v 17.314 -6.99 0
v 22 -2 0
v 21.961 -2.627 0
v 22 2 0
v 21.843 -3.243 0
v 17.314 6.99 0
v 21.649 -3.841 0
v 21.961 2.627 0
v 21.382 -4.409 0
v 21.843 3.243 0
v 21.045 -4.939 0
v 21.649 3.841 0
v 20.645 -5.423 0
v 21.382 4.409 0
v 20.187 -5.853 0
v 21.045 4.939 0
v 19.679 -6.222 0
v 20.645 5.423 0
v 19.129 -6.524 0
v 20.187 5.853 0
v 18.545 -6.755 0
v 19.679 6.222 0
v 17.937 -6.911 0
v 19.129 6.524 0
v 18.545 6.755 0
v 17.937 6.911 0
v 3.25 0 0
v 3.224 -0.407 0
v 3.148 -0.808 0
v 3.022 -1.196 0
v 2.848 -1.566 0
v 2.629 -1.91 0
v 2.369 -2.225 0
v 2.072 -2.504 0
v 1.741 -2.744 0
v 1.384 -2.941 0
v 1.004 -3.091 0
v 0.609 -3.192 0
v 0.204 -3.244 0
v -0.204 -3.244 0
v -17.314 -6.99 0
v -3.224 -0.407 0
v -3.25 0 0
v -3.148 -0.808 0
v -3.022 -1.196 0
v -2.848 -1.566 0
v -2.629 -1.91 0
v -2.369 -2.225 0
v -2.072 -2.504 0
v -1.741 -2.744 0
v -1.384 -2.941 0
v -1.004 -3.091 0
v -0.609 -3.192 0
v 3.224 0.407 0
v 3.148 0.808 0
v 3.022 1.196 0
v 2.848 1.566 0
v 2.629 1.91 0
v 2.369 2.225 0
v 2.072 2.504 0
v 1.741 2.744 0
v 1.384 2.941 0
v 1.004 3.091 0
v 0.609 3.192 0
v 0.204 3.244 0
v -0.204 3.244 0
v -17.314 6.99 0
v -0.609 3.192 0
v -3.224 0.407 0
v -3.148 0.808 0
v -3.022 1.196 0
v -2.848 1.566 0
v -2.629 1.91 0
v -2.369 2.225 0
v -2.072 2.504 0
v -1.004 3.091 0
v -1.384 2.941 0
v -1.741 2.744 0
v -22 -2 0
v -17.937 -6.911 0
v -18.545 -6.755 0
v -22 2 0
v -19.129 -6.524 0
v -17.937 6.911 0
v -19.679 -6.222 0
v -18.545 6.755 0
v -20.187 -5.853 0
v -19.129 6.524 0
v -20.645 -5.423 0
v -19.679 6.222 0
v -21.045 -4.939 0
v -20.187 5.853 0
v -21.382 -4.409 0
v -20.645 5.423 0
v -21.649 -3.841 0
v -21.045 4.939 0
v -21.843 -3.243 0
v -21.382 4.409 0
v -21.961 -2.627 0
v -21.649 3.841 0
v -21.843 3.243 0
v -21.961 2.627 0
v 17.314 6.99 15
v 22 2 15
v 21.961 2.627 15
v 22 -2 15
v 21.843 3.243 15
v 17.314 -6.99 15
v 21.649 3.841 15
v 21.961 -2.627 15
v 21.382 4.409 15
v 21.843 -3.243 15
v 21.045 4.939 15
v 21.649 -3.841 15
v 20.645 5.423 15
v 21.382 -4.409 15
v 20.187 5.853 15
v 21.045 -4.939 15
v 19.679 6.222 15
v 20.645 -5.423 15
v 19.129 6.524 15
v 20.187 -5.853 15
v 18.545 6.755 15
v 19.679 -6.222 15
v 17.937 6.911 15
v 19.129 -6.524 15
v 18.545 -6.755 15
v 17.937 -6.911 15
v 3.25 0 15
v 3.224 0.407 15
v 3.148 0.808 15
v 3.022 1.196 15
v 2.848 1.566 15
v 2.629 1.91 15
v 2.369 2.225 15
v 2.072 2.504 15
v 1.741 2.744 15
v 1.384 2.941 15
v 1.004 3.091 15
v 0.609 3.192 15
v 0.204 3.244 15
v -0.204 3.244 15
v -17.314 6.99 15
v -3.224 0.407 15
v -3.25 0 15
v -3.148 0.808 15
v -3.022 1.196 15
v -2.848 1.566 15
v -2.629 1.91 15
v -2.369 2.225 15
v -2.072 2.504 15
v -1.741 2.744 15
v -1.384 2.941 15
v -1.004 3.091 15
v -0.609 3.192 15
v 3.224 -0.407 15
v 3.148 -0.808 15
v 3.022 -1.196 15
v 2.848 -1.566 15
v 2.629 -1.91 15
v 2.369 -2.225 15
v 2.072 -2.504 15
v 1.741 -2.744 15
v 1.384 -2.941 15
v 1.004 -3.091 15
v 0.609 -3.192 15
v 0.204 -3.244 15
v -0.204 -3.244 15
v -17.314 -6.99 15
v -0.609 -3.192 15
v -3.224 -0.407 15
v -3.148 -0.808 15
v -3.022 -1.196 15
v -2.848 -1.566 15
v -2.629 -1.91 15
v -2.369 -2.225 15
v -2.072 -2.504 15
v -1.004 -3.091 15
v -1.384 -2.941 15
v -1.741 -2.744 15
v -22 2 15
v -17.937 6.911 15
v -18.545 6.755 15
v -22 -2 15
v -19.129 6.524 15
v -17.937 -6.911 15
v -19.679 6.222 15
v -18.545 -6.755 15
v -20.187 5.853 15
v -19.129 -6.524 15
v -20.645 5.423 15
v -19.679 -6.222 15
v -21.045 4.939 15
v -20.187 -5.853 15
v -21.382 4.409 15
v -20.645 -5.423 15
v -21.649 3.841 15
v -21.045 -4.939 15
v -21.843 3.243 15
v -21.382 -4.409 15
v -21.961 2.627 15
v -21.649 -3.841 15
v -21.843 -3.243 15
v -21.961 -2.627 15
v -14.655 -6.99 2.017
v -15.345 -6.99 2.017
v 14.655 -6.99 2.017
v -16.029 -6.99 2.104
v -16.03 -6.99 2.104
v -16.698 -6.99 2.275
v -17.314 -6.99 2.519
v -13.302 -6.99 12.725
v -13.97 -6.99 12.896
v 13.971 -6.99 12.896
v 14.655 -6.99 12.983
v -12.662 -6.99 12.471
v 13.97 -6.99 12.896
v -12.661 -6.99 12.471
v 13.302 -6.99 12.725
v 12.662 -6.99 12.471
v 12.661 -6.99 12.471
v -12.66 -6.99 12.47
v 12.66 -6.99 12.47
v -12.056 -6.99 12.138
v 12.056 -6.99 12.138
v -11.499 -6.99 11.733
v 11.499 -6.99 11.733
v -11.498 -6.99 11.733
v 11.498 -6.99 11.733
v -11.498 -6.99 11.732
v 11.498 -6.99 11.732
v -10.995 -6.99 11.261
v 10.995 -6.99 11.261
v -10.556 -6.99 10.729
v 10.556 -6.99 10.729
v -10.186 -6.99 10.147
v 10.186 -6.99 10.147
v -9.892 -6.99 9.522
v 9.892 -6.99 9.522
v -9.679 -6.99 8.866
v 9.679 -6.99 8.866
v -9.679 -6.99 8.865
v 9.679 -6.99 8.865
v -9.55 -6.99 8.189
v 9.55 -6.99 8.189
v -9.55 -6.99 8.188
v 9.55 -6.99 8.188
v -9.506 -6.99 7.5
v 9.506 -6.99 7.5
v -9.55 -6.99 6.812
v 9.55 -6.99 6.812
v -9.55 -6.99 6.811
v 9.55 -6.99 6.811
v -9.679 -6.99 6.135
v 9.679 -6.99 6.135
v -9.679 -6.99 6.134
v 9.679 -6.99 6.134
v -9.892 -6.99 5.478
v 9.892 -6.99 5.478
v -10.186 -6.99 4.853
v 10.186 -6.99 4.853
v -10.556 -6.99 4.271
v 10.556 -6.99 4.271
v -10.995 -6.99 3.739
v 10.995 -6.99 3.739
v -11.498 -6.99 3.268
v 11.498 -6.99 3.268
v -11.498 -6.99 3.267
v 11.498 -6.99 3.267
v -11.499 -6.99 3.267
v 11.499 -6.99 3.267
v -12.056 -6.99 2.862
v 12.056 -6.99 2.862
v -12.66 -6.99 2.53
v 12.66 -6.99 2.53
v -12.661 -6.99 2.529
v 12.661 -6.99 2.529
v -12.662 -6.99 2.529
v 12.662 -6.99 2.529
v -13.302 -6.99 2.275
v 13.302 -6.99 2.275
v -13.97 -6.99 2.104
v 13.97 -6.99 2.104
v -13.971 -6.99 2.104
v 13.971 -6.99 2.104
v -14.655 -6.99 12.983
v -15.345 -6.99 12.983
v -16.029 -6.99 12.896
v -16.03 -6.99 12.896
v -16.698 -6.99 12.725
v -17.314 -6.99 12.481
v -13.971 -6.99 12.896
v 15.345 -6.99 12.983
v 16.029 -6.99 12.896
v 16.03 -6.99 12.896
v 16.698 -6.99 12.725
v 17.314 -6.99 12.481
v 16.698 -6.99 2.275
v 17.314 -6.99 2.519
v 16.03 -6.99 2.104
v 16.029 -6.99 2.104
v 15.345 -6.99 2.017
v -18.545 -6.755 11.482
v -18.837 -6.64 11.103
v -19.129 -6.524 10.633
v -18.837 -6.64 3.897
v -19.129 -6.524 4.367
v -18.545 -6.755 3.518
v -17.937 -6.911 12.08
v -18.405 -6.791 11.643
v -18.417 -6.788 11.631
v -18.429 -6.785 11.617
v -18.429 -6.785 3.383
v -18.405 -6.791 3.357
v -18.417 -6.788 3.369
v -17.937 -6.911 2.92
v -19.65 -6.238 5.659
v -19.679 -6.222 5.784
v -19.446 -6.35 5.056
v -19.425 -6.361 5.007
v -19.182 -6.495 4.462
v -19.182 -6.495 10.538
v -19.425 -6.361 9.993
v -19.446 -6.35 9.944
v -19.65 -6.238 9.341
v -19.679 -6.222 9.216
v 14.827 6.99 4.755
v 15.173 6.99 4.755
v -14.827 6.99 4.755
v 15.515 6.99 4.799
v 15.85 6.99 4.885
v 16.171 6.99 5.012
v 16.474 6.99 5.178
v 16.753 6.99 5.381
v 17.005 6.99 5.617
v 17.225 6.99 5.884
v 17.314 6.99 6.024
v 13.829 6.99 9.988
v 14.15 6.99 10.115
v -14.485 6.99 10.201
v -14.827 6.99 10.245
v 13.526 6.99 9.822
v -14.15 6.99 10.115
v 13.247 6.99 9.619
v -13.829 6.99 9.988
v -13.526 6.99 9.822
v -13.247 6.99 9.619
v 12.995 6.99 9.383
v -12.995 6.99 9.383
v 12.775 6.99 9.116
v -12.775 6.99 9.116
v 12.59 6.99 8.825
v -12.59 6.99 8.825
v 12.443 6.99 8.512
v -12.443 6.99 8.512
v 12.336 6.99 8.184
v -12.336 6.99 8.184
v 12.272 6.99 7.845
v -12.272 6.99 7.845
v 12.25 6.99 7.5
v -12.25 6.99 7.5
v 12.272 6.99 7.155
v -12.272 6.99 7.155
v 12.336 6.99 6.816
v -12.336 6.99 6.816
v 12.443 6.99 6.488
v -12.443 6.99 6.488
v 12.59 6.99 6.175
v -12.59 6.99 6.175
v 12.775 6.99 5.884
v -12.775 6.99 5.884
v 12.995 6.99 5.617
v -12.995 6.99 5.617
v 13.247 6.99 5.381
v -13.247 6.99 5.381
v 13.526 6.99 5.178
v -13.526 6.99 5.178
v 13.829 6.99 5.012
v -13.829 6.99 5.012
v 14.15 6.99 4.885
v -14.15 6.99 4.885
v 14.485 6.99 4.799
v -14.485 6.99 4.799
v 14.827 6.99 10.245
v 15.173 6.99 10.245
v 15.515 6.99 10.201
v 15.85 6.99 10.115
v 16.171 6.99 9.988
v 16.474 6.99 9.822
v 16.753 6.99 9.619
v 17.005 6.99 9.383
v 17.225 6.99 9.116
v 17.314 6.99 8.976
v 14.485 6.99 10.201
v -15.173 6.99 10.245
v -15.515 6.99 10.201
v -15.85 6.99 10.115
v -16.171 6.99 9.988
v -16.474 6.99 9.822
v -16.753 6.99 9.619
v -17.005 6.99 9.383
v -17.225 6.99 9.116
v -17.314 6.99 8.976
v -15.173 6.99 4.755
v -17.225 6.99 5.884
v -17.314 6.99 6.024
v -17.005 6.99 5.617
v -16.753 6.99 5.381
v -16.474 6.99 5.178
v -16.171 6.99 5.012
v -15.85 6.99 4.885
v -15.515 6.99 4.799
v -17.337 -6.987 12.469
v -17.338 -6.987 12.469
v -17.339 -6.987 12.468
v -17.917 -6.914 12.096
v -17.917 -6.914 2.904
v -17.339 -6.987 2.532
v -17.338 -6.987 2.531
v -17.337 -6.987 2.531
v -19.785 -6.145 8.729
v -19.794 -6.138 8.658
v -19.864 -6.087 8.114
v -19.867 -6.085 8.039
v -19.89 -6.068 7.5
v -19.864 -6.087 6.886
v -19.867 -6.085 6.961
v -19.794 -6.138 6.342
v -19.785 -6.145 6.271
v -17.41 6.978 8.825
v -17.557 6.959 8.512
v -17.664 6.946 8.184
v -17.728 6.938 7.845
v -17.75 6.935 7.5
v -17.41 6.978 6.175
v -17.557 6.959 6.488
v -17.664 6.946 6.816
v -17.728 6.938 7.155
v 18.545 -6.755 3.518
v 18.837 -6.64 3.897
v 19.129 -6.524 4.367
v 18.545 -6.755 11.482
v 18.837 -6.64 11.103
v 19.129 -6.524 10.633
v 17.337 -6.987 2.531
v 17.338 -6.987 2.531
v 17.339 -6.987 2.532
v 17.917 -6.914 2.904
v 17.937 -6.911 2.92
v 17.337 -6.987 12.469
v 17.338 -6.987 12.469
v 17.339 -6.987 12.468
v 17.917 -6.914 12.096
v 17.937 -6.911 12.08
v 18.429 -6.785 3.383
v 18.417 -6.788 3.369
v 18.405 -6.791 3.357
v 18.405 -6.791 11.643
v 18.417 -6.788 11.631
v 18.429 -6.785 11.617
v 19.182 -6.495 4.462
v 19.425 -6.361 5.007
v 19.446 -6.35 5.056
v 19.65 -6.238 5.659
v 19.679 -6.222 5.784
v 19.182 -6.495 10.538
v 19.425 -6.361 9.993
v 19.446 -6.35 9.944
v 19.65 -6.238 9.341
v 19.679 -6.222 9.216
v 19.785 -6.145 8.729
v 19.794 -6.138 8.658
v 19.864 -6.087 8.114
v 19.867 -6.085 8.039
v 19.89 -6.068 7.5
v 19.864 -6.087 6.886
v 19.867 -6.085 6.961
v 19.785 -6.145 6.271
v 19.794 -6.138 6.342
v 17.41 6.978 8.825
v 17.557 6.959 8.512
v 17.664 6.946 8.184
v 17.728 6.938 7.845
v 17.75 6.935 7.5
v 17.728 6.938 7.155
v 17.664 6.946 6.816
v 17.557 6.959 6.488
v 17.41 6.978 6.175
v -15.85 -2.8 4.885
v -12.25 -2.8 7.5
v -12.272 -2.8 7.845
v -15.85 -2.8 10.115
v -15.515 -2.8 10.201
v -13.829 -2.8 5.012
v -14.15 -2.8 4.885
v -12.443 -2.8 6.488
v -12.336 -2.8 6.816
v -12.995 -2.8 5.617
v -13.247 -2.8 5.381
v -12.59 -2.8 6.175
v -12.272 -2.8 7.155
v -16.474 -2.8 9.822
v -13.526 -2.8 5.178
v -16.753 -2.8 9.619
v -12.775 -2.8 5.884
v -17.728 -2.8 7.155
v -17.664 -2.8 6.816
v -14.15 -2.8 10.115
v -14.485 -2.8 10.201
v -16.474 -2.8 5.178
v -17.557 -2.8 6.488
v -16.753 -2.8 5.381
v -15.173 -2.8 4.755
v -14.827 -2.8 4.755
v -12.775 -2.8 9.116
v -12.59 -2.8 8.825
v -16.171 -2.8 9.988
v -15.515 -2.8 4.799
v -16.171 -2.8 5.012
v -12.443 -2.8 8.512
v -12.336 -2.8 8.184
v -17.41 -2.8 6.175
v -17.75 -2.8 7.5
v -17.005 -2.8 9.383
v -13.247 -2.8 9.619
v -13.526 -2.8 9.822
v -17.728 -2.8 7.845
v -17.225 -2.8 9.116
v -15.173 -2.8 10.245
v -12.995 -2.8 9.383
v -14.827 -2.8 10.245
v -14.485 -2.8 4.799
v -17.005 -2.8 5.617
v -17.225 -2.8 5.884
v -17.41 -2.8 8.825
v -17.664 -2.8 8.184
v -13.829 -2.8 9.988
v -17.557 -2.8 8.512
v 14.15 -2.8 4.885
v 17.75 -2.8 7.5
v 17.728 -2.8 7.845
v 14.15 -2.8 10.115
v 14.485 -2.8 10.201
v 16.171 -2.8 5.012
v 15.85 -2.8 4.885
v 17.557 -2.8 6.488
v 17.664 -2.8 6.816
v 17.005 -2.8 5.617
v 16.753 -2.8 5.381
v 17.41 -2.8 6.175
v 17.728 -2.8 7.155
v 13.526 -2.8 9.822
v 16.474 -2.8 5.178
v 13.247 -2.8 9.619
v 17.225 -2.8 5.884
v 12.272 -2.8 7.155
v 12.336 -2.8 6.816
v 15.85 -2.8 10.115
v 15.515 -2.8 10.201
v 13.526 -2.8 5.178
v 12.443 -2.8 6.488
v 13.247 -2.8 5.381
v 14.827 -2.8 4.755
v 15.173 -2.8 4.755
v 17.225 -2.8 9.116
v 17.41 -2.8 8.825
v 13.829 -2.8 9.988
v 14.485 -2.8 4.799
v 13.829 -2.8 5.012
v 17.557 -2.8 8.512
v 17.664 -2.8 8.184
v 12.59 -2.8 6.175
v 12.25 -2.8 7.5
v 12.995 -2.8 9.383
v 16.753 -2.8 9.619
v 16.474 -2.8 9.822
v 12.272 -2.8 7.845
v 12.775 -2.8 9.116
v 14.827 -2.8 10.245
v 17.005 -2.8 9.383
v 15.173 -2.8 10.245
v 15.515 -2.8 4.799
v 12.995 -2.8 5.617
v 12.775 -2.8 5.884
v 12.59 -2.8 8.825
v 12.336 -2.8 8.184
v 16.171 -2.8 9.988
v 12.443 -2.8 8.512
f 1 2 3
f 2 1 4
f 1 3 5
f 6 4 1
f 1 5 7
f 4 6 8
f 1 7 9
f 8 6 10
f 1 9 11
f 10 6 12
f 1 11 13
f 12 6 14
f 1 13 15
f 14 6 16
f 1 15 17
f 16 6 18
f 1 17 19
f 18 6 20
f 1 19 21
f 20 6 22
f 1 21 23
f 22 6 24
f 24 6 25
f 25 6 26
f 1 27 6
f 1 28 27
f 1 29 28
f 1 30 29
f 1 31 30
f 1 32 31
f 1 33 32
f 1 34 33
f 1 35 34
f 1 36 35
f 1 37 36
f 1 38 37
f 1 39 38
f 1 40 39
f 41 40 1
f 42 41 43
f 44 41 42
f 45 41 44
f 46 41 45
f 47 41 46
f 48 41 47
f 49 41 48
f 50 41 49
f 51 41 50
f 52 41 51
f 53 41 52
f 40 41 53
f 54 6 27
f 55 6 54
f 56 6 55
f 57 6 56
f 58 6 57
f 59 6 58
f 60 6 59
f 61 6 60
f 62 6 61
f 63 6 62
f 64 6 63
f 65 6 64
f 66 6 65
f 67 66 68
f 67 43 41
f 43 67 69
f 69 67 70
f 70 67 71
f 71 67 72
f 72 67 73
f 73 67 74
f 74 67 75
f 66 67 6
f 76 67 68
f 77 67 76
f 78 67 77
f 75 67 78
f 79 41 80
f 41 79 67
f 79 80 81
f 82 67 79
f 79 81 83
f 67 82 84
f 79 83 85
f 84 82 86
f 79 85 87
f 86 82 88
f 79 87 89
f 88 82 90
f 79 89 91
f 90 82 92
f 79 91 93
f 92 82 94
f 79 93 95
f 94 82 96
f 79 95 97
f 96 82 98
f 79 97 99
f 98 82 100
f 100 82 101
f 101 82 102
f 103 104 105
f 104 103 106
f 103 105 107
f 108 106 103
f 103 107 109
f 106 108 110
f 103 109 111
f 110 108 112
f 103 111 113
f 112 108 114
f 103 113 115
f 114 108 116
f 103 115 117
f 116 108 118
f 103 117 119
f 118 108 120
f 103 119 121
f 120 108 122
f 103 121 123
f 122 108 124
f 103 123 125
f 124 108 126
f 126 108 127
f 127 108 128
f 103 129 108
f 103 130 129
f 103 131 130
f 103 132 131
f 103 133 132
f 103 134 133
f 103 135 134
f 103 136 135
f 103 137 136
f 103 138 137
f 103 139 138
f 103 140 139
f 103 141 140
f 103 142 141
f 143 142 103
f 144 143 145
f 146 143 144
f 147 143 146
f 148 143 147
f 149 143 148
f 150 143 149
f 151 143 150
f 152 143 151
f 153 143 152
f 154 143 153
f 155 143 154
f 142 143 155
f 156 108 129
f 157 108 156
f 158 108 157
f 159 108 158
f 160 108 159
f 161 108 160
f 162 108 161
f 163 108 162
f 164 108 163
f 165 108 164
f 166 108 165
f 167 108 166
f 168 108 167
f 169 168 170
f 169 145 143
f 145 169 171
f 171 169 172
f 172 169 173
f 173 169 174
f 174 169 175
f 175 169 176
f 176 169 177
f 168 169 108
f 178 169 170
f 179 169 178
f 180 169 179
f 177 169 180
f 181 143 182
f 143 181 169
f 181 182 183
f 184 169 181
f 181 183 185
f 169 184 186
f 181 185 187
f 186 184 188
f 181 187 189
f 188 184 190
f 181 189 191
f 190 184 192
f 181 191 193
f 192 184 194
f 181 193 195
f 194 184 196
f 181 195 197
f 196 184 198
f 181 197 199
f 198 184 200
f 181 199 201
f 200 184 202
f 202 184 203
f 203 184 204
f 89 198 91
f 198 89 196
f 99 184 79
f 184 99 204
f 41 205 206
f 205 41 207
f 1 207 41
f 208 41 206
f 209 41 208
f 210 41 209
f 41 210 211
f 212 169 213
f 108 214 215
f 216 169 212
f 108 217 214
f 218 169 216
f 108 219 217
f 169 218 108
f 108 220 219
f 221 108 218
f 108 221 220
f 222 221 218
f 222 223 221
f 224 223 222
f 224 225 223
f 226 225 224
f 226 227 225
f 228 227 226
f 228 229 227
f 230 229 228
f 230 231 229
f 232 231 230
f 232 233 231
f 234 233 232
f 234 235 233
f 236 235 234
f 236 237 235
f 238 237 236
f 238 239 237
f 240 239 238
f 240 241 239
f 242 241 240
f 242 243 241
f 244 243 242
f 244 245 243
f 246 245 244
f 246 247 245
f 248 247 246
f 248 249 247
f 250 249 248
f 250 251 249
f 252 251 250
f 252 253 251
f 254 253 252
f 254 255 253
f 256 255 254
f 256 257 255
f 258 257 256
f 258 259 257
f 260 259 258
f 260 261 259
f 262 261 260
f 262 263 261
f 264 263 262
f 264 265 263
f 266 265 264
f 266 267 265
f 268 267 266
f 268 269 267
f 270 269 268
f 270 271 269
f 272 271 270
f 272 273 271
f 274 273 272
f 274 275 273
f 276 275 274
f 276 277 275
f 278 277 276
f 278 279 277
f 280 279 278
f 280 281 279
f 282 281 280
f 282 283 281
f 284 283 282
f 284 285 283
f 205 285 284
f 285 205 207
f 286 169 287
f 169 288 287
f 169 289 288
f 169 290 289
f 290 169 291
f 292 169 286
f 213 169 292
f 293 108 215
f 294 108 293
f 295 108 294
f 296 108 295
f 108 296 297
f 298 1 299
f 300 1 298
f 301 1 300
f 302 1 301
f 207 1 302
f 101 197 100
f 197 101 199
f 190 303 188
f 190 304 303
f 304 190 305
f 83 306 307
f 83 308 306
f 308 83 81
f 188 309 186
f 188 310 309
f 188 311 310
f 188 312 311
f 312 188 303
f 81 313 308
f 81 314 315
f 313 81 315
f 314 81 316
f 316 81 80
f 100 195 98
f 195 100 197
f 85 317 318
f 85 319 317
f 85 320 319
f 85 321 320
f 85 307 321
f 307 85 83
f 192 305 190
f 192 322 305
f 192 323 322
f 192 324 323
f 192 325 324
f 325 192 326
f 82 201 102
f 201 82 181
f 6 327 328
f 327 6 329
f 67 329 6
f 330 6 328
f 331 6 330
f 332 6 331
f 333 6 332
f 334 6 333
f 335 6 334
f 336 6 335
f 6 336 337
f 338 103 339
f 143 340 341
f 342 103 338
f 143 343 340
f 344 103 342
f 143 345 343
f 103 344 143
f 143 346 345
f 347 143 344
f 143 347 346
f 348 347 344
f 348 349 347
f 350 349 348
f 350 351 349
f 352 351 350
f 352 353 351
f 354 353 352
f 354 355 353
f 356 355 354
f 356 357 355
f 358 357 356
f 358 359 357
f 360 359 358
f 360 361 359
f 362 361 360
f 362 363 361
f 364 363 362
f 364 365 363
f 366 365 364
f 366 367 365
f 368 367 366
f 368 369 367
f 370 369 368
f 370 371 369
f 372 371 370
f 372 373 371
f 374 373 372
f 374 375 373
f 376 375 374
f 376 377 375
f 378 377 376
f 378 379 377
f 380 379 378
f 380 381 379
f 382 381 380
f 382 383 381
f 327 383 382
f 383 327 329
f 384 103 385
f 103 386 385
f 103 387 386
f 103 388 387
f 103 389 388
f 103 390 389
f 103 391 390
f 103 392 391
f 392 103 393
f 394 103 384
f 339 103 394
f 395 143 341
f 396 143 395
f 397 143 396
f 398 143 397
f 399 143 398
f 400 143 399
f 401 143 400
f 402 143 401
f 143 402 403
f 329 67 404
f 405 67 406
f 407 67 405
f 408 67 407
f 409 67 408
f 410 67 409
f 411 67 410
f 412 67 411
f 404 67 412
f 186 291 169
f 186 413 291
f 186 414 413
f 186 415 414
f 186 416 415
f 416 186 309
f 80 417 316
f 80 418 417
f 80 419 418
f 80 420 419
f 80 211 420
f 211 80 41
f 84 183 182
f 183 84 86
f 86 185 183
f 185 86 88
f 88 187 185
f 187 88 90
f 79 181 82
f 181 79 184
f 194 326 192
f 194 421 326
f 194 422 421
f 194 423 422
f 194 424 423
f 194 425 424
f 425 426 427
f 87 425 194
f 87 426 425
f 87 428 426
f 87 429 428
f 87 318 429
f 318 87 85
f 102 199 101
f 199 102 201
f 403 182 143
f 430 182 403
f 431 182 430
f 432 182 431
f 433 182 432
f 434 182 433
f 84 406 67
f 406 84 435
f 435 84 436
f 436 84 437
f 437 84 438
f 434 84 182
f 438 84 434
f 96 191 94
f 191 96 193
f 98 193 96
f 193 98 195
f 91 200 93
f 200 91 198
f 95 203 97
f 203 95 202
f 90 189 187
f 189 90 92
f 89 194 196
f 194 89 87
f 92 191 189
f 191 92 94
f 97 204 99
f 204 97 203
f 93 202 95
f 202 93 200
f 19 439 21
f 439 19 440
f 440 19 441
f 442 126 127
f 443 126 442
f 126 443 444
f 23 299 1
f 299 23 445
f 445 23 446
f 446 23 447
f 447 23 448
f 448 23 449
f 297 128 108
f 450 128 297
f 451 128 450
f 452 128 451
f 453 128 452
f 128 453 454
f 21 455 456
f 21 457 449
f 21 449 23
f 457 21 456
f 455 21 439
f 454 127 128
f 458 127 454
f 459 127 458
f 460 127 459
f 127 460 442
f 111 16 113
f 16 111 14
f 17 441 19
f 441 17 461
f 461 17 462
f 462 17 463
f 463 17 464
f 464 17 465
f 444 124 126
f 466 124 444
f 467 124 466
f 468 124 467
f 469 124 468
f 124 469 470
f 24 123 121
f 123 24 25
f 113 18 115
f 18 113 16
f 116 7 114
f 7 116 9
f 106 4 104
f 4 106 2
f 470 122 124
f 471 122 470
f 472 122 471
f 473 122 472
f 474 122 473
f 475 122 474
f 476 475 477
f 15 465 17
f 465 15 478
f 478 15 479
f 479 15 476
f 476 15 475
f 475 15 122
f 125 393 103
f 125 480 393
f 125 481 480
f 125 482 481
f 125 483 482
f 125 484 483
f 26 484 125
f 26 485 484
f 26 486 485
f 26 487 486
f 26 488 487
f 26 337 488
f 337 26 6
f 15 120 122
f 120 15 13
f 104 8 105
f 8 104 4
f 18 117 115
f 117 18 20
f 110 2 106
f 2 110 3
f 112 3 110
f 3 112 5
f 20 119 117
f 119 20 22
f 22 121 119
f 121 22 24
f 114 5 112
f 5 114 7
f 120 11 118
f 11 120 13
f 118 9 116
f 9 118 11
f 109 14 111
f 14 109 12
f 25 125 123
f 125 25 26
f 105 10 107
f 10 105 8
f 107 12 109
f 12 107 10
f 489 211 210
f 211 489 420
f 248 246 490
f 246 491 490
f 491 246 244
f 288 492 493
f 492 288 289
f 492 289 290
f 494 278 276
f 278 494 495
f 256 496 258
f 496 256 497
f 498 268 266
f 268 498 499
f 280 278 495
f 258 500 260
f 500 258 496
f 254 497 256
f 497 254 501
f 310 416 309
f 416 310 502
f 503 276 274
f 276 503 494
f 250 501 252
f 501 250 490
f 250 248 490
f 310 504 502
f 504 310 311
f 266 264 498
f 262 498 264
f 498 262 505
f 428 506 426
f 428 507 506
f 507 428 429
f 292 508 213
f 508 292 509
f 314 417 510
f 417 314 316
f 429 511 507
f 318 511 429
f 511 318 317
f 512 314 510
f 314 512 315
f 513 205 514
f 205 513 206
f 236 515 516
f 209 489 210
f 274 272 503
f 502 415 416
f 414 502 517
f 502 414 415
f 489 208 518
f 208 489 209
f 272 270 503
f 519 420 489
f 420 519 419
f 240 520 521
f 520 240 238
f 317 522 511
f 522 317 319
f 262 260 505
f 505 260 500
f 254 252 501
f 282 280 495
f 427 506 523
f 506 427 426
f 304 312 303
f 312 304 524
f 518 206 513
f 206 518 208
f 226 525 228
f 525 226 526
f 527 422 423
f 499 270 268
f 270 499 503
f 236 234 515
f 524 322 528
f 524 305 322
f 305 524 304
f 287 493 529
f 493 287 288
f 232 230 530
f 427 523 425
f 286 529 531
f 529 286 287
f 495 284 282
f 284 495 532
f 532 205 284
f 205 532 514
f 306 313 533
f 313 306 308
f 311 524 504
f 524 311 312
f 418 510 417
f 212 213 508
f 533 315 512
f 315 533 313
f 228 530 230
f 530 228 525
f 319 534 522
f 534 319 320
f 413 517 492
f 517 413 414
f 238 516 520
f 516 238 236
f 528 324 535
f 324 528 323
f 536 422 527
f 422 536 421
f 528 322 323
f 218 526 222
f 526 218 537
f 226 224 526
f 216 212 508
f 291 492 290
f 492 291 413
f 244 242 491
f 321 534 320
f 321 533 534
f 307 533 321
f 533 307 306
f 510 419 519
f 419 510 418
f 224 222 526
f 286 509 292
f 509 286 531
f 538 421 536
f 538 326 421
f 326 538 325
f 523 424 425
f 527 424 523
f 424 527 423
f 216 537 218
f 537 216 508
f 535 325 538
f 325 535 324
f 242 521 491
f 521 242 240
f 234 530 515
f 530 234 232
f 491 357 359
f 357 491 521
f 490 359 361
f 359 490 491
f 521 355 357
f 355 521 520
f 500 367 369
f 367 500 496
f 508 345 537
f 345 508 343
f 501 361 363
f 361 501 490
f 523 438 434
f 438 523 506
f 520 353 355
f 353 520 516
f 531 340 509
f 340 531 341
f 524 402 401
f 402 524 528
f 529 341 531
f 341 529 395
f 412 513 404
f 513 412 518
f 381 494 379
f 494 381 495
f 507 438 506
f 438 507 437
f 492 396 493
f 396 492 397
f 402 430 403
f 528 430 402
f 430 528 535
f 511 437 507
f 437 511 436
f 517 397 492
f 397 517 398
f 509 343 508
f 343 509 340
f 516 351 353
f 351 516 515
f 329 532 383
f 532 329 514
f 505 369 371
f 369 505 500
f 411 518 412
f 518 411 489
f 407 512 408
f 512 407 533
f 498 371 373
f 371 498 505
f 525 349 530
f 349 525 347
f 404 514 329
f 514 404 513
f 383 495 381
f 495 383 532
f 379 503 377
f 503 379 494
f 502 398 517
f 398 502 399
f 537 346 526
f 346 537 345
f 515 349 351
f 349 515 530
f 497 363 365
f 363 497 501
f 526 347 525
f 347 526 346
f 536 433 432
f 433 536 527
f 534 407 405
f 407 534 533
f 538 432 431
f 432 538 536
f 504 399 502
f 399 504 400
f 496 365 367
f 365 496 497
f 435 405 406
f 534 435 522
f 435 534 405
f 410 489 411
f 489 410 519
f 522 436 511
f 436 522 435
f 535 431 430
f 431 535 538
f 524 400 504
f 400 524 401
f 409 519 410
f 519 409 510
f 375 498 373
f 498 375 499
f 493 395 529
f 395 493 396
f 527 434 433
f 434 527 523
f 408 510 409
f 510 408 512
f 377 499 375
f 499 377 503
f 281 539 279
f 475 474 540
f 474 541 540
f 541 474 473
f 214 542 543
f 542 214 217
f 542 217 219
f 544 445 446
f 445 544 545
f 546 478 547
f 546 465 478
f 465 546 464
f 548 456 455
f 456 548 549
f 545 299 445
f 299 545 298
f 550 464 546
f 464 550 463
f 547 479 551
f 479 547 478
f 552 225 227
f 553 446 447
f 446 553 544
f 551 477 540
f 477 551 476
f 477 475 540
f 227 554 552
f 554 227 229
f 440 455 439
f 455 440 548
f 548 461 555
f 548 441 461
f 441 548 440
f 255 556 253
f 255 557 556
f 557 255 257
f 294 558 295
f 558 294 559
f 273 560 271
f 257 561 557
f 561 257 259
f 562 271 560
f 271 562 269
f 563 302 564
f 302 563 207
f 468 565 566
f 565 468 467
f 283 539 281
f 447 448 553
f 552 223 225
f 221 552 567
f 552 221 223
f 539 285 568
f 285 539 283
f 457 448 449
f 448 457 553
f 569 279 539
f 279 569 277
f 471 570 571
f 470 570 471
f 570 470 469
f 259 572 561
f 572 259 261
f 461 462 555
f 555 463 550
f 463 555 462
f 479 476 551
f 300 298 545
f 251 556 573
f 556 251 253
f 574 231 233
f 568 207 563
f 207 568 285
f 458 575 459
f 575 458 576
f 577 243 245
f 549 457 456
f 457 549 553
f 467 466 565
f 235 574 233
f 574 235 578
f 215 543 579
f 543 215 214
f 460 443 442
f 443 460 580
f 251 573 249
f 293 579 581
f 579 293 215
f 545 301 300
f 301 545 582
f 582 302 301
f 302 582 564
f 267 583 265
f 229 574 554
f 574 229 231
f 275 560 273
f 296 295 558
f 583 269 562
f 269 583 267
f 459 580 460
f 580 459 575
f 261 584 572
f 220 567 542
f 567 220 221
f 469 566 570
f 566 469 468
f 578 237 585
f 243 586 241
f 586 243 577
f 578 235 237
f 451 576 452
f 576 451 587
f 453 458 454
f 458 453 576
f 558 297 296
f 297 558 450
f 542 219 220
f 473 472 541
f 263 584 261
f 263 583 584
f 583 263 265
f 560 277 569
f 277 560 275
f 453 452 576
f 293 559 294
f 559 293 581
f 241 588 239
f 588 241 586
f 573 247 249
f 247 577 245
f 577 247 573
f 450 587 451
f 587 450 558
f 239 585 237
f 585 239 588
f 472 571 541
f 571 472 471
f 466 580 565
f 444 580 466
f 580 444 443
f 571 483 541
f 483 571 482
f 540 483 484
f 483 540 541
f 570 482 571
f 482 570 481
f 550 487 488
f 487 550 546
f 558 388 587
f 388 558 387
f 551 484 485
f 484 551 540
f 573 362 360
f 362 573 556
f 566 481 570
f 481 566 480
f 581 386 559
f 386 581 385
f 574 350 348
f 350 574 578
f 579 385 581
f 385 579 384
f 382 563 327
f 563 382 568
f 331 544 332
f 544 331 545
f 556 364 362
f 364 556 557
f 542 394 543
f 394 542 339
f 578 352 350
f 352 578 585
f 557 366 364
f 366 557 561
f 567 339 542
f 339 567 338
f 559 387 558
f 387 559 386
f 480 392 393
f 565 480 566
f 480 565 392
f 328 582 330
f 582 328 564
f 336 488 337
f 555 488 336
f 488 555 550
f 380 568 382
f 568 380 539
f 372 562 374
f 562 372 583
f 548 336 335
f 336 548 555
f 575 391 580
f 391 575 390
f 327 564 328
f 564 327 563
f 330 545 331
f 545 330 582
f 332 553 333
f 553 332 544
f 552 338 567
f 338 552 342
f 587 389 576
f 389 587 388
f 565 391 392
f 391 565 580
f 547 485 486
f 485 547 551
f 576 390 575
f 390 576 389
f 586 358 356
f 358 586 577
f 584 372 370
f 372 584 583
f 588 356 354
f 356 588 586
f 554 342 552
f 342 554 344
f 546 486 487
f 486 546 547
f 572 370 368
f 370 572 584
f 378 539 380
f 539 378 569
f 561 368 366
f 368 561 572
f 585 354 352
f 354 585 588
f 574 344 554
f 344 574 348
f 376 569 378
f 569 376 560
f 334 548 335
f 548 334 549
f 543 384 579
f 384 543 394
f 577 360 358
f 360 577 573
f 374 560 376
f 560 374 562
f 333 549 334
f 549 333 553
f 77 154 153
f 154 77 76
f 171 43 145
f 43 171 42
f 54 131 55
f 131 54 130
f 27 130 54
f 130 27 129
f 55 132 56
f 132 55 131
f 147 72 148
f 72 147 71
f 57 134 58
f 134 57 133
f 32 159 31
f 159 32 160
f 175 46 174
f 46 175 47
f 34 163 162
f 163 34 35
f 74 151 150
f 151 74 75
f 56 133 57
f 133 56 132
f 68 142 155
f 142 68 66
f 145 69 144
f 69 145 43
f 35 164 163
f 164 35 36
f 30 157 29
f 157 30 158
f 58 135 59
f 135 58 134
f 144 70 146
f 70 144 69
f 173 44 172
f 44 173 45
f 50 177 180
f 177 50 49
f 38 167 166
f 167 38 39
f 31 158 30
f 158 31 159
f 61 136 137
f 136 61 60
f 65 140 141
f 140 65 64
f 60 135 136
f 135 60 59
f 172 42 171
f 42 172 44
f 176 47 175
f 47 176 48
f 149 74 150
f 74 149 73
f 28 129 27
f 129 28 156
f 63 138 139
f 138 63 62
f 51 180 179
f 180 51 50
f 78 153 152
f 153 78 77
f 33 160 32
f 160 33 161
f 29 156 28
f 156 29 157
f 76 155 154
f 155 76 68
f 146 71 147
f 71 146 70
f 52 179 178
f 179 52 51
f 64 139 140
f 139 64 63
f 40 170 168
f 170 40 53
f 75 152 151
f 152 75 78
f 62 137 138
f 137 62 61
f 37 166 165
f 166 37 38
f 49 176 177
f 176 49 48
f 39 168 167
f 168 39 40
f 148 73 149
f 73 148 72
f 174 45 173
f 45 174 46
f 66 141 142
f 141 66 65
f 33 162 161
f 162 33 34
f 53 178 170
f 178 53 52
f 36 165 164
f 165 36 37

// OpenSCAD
$fn = 50;


difference() {
	union() {
		cylinder(h = 15, r = 7.0000000000);
		translate(v = [-7.5000000000, 0.0000000000, 0]) {
			hull() {
				translate(v = [-9.5000000000, 2.0000000000, 0]) {
					cylinder(h = 15, r = 5);
				}
				translate(v = [9.5000000000, 2.0000000000, 0]) {
					cylinder(h = 15, r = 5);
				}
				translate(v = [-9.5000000000, -2.0000000000, 0]) {
					cylinder(h = 15, r = 5);
				}
				translate(v = [9.5000000000, -2.0000000000, 0]) {
					cylinder(h = 15, r = 5);
				}
			}
		}
		translate(v = [-7.5000000000, 0.0000000000, 0]) {
			hull() {
				translate(v = [-9.5000000000, 2.0000000000, 0]) {
					cylinder(h = 15, r = 5);
				}
				translate(v = [9.5000000000, 2.0000000000, 0]) {
					cylinder(h = 15, r = 5);
				}
				translate(v = [-9.5000000000, -2.0000000000, 0]) {
					cylinder(h = 15, r = 5);
				}
				translate(v = [9.5000000000, -2.0000000000, 0]) {
					cylinder(h = 15, r = 5);
				}
			}
		}
		translate(v = [7.5000000000, 0.0000000000, 0]) {
			hull() {
				translate(v = [-9.5000000000, 2.0000000000, 0]) {
					cylinder(h = 15, r = 5);
				}
				translate(v = [9.5000000000, 2.0000000000, 0]) {
					cylinder(h = 15, r = 5);
				}
				translate(v = [-9.5000000000, -2.0000000000, 0]) {
					cylinder(h = 15, r = 5);
				}
				translate(v = [9.5000000000, -2.0000000000, 0]) {
					cylinder(h = 15, r = 5);
				}
			}
		}
		translate(v = [7.5000000000, 0.0000000000, 0]) {
			hull() {
				translate(v = [-9.5000000000, 2.0000000000, 0]) {
					cylinder(h = 15, r = 5);
				}
				translate(v = [9.5000000000, 2.0000000000, 0]) {
					cylinder(h = 15, r = 5);
				}
				translate(v = [-9.5000000000, -2.0000000000, 0]) {
					cylinder(h = 15, r = 5);
				}
				translate(v = [9.5000000000, -2.0000000000, 0]) {
					cylinder(h = 15, r = 5);
				}
			}
		}
	}
	union() {
		translate(v = [-15.0000000000, -7.0000000000, 7.5000000000]) {
			rotate(a = [90, 0, 0]) {
				difference() {
					union() {
						#translate(v = [0, 0, -14.0000000000]) {
							cylinder(h = 14, r = 2.2500000000);
						}
						#translate(v = [0, 0, -4.2000000000]) {
							cylinder(h = 4.2000000000, r1 = 2.7500000000, r2 = 5.5000000000);
						}
						#translate(v = [0, 0, -14.0000000000]) {
							cylinder(h = 14, r = 2.7500000000);
						}
						#translate(v = [0, 0, -14.0000000000]) {
							cylinder(h = 14, r = 2.2500000000);
						}
					}
					union();
				}
			}
		}
		translate(v = [15.0000000000, -7.0000000000, 7.5000000000]) {
			rotate(a = [90, 0, 0]) {
				difference() {
					union() {
						#translate(v = [0, 0, -14.0000000000]) {
							cylinder(h = 14, r = 2.2500000000);
						}
						#translate(v = [0, 0, -4.2000000000]) {
							cylinder(h = 4.2000000000, r1 = 2.7500000000, r2 = 5.5000000000);
						}
						#translate(v = [0, 0, -14.0000000000]) {
							cylinder(h = 14, r = 2.7500000000);
						}
						#translate(v = [0, 0, -14.0000000000]) {
							cylinder(h = 14, r = 2.2500000000);
						}
					}
					union();
				}
			}
		}
		translate(v = [0, 0, -100]) {
			cylinder(h = 200, r = 3.2500000000);
		}
		translate(v = [0, 0, -100]) {
			cylinder(h = 200, r = 1.8000000000);
		}
	}
}
